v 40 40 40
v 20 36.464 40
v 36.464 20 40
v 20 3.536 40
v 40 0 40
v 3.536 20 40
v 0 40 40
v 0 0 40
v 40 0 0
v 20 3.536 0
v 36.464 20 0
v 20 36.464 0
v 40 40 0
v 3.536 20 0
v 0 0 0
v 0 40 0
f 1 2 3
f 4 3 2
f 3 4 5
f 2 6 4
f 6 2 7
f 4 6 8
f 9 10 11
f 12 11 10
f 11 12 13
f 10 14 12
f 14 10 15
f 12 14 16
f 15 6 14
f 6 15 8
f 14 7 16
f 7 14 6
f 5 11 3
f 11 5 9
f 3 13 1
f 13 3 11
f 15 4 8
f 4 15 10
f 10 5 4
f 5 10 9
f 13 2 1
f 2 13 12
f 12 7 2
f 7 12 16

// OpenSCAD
difference() {
	cube(40);
	scale([0.5, 4 / sqrt(2), 4]) { //Left side.
		rotate([0, 0, 45]) {
			cube(10);
		}
	}
	translate([40, 0, 0]) {
		scale([0.5, 4 / sqrt(2), 4]) { //Right side.
			rotate([0, 0, 45]) {
				cube(10);
			}
		}
	}
	scale([4 / sqrt(2), 0.5, 4]) { //Front side.
		rotate([0, 0, -45]) {
			cube(10);
		}
	}
	translate([0, 40, 0]) {
		scale([4 / sqrt(2), 0.5, 4]) { //Back side.
			rotate([0, 0, -45]) {
				cube(10);
			}
		}
	}
}
